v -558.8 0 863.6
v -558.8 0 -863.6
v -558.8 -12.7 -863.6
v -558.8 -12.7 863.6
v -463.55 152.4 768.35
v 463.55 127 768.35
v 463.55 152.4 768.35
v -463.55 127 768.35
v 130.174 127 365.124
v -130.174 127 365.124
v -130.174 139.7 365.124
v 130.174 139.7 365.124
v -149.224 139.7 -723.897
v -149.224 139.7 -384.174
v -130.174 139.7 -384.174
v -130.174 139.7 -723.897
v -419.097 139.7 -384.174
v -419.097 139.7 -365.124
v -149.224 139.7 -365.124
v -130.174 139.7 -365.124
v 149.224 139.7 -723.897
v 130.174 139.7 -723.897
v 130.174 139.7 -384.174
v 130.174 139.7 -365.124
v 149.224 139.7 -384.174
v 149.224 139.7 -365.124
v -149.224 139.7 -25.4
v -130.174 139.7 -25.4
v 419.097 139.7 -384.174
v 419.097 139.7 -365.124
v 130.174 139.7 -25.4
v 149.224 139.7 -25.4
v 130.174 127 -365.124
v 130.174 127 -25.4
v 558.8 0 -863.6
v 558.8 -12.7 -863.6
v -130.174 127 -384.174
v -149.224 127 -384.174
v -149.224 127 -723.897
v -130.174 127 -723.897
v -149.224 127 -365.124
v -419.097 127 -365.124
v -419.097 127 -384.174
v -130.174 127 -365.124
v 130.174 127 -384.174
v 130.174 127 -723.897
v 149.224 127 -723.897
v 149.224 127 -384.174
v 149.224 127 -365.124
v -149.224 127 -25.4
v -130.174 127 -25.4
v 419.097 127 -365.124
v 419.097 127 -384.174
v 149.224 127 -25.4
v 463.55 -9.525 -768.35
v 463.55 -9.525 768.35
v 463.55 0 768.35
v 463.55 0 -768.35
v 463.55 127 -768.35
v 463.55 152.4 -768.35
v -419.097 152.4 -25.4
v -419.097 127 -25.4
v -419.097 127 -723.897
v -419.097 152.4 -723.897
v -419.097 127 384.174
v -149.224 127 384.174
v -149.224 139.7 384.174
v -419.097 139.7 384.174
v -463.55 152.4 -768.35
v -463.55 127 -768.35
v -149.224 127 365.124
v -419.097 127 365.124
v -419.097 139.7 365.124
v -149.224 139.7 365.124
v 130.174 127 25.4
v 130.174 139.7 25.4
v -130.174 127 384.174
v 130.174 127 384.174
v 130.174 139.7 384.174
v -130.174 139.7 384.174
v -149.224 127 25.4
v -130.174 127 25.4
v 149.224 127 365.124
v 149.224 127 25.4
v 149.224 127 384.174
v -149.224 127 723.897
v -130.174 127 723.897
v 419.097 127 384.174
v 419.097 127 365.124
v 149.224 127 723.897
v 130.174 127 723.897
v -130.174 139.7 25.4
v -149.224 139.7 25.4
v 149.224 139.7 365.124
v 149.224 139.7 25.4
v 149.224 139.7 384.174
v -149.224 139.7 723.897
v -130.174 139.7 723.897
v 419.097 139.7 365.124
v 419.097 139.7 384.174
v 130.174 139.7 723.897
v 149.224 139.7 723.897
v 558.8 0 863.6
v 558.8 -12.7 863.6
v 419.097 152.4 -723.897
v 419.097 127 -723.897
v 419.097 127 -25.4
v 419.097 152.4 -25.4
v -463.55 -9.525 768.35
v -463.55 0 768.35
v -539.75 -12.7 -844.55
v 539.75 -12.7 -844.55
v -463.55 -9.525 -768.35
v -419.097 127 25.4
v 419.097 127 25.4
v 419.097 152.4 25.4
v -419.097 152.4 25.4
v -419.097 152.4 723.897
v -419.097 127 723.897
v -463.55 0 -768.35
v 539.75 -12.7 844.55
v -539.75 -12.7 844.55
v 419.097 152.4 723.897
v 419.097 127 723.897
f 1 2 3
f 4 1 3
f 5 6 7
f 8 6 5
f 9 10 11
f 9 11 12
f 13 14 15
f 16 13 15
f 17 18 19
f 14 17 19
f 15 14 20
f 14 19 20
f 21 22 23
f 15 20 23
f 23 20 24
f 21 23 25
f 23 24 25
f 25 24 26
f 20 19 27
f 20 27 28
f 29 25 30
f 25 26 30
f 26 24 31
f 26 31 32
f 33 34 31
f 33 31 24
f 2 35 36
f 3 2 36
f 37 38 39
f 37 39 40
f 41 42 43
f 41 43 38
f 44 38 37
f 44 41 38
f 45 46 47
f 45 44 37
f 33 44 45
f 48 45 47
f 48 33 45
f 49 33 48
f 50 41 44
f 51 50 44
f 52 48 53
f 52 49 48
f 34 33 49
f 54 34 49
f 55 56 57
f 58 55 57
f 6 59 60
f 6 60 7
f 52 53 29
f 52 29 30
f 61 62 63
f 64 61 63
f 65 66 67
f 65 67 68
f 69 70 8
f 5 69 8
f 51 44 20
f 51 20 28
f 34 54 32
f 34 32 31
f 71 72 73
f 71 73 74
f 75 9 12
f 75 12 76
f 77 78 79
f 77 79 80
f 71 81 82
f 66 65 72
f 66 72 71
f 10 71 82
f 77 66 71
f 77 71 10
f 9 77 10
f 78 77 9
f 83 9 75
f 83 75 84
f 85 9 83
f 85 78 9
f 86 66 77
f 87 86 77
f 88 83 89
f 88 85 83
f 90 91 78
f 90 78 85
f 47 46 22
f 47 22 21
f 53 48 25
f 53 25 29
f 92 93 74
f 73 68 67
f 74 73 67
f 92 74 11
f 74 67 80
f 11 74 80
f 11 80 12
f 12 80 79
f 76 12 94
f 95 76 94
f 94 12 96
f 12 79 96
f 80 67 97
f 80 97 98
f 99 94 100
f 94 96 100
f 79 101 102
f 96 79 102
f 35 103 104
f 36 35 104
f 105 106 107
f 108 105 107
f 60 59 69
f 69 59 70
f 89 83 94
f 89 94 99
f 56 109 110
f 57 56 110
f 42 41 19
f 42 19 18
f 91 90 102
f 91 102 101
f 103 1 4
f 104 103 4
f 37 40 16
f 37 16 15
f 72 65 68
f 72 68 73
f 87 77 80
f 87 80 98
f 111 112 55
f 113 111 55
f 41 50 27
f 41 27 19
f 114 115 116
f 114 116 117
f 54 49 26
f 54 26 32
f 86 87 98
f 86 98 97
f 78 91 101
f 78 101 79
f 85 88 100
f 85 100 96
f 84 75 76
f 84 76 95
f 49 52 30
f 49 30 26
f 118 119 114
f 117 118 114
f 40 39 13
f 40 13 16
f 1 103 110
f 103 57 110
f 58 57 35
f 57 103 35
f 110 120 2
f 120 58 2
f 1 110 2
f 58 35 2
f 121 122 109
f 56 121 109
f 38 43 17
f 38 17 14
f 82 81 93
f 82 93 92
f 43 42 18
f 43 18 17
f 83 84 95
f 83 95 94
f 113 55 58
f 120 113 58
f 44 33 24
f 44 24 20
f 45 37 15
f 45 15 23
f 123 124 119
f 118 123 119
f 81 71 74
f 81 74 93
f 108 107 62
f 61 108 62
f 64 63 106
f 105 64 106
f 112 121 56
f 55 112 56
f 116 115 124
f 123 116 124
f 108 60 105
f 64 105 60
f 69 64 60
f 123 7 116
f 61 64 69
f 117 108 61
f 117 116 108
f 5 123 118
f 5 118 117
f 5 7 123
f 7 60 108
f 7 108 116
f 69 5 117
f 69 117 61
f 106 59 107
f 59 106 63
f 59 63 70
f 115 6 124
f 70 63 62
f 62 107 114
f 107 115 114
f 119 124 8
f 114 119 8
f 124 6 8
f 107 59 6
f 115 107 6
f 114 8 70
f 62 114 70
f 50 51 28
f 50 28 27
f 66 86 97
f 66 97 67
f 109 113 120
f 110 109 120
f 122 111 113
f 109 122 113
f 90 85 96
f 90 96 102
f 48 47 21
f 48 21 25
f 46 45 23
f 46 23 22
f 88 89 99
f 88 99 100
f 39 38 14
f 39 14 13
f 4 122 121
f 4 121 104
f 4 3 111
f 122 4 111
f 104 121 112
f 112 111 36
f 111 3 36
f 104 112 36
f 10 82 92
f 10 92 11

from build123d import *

# Parameters (mm, degrees)
F3_W     = 927.1
F3_H     = 1536.7
F3_W_2   = 838.19492
F3_H_2   = 50.8
F4_DEPTH = 25.4
F6_DEPTH = 12.7


with BuildPart() as f4:
    # F3 (on 3pt) → F4 (new body)
    with BuildSketch(Plane(origin=(0, 127, 0), x_dir=(-1, 0, 0), z_dir=(0, 1, 0))):
        Rectangle(F3_W, F3_H)
        Polygon((-419.09746, 25.4), (-419.09746, 723.89746), (419.09746, 723.89746), (419.09746, 25.4), (419.09746, -25.4), (419.09746, -723.89746), (-419.09746, -723.89746), (-419.09746, -25.4), align=None, mode=Mode.SUBTRACT)
        Rectangle(F3_W_2, F3_H_2)
    extrude(amount=F4_DEPTH)


with BuildPart() as f6:
    # F5 (on face) → F6 (new body)
    with BuildSketch(Plane.XZ.offset(-127)):
        Polygon((130.1741533333, -723.89746), (149.2241533333, -723.89746), (149.2241533333, -384.17373), (419.09746, -384.17373), (419.09746, -365.12373), (149.2241533333, -365.12373), (149.2241533333, -25.4), (130.1741533333, -25.4), (130.1741533333, -365.12373), (-130.1741533333, -365.12373), (-130.1741533333, -25.4), (-149.2241533333, -25.4), (-149.2241533333, -365.12373), (-419.09746, -365.12373), (-419.09746, -384.17373), (-149.2241533333, -384.17373), (-149.2241533333, -723.89746), (-130.1741533333, -723.89746), (-130.1741533333, -384.17373), (130.1741533333, -384.17373), align=None)
    extrude(amount=-F6_DEPTH)


with BuildPart() as f6b:
    # F5 (on face) → F6, piece 2 (new body)
    with BuildSketch(Plane.XZ.offset(-127)):
        Polygon((-149.2241533333, 25.4), (-130.1741533333, 25.4), (-130.1741533333, 365.12373), (130.1741533333, 365.12373), (130.1741533333, 25.4), (149.2241533333, 25.4), (149.2241533333, 365.12373), (419.09746, 365.12373), (419.09746, 384.17373), (149.2241533333, 384.17373), (149.2241533333, 723.89746), (130.1741533333, 723.89746), (130.1741533333, 384.17373), (-130.1741533333, 384.17373), (-130.1741533333, 723.89746), (-149.2241533333, 723.89746), (-149.2241533333, 384.17373), (-419.09746, 384.17373), (-419.09746, 365.12373), (-149.2241533333, 365.12373), align=None)
    extrude(amount=-F6_DEPTH)


with BuildPart() as f8:
    # F8: sweep along a path in F0
    with BuildLine(Plane.XZ) as f8_path:
        Line((-558.8, 863.6), (-558.8, -863.6))
        Line((-558.8, -863.6), (558.8, -863.6))
        Line((558.8, -863.6), (558.8, 863.6))
        Line((558.8, 863.6), (-558.8, 863.6))
    # F7 (on Top) → F8 (sweep)
    with BuildSketch(Plane.XY):
        Polygon((-463.55, -9.525), (-463.55, 0), (-558.8, 0), (-558.8, -12.7), (-539.75, -12.7), align=None)
    sweep(path=f8_path.line, transition=Transition.RIGHT)


solid = Compound([f4.part, f6.part, f6b.part, f8.part])
